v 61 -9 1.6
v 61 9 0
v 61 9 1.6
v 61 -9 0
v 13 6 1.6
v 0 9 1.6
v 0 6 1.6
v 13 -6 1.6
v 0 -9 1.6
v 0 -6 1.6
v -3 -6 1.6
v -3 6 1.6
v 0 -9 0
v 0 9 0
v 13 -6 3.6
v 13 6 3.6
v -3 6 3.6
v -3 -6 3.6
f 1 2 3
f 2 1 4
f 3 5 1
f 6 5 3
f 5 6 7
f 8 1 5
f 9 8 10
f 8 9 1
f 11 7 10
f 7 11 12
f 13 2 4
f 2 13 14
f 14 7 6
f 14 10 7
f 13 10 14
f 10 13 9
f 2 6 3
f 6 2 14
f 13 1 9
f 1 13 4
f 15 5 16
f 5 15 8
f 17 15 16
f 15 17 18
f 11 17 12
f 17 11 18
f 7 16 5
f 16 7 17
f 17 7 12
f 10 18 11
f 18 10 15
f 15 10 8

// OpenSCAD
pcb_dimensions = [61, 18, 1.6];

sd_card_dimensions = [16, 12, 2];
sd_card_overhang = 3;

module Teensy35()
{
  /* PCB */
  translate([0, -pcb_dimensions[1] / 2, 0])
  {
    color("darkgreen")
    {
      cube(pcb_dimensions);
    }
  }

  /* SD card */
  translate([-sd_card_overhang, -sd_card_dimensions[1] / 2, pcb_dimensions[2]])
  {
    color("silver")
    {
      cube(sd_card_dimensions);
    }
  }
}

module Teensy35SdCardCutout()
{
  size = [50, 20, 5];
  translate([-size[0] / 2, -size[1] / 2, 0])
  {
    cube(size);
  }
}

Teensy35();
